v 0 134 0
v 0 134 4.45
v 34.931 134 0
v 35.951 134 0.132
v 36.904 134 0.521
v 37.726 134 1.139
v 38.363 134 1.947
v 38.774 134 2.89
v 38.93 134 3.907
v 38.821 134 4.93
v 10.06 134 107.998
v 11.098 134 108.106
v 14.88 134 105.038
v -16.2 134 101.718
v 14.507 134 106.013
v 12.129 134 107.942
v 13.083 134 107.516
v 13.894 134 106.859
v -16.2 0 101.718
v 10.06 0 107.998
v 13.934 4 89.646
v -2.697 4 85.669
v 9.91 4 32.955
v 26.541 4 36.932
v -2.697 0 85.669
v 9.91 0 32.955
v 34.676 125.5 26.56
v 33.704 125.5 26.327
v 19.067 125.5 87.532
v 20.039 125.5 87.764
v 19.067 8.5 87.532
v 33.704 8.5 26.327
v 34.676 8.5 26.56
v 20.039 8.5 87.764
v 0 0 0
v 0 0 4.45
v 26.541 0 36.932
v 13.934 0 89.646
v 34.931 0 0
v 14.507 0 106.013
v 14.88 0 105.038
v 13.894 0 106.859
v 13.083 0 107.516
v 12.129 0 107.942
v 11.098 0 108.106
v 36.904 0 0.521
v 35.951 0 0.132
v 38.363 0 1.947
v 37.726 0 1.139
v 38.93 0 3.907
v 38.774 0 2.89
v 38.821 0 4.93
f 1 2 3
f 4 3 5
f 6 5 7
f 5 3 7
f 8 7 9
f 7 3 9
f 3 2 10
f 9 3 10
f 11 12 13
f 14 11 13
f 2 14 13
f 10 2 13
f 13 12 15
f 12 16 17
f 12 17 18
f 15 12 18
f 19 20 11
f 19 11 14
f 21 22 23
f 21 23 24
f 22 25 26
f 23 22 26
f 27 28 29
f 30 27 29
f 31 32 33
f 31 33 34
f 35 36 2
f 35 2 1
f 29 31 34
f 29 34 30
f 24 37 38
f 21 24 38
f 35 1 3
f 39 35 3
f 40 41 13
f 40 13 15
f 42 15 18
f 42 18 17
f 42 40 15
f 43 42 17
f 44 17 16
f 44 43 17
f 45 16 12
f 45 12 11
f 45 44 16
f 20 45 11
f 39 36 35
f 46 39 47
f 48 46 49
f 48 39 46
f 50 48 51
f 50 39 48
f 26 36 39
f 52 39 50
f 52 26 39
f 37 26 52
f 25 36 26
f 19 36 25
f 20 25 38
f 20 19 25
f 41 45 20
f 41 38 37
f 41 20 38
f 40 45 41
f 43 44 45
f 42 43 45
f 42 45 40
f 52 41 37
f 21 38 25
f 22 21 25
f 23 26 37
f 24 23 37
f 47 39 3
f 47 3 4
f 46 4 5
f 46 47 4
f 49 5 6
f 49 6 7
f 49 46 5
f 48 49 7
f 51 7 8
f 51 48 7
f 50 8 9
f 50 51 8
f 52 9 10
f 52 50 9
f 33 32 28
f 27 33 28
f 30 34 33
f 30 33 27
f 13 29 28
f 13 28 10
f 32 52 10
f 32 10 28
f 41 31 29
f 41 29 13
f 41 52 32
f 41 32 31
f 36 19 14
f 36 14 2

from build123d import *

# Parameters (mm, degrees)
F1_DEPTH = 134
F2_DEPTH = 4
F3_W     = 117
F3_H     = 62.9306063323
F4_DEPTH = 1


with BuildPart() as f1:
    # F0 (on Front) → F1 (new body)
    with BuildSketch(Plane.XZ):
        with BuildLine():
            Line((0, 4.45), (0, 0))
            Line((0, 0), (34.9306063323, 0))
            ThreePointArc((34.9306063323, 0), (38.0707858746, 1.5222444749), (38.8209049377, 4.9303637789))
            Line((38.8209049377, 4.9303637789), (14.8801779705, 105.0380623451))
            ThreePointArc((14.8801779705, 105.0380623451), (13.0828693528, 107.5164216279), (10.0595155863, 107.9979971716))
            Line((10.0595155863, 107.9979971716), (-16.2, 101.7180416642))
            Line((-16.2, 101.7180416642), (0, 4.45))
        make_face()
        Polygon((-2.6967180639, 85.6686218319), (13.934308474, 89.6459269865), (26.5407376777, 36.9323808837), (9.9097111398, 32.9550757291), align=None, mode=Mode.SUBTRACT)
        Polygon((26.5407376777, 36.9323808837), (13.934308474, 89.6459269865), (-2.6967180639, 85.6686218319), (9.9097111398, 32.9550757291), align=None)
    extrude(amount=-F1_DEPTH)

    # F0 (on Front) → F2 (cut)
    with BuildSketch(Plane.XZ):
        Polygon((26.5407376777, 36.9323808837), (13.934308474, 89.6459269865), (-2.6967180639, 85.6686218319), (9.9097111398, 32.9550757291), align=None)
    extrude(amount=-F2_DEPTH, mode=Mode.SUBTRACT)

    # F3 (on face) → F4 (join)
    with BuildSketch(Plane(origin=(37.8360580974, 0, 9.0484822786), x_dir=(0, 1, 0), z_dir=(0.9725746513, 0, 0.2325909447))):
        with Locations((67, 49.2310590451)):
            Rectangle(F3_W, F3_H)
    extrude(amount=F4_DEPTH)


solid = f1.part
